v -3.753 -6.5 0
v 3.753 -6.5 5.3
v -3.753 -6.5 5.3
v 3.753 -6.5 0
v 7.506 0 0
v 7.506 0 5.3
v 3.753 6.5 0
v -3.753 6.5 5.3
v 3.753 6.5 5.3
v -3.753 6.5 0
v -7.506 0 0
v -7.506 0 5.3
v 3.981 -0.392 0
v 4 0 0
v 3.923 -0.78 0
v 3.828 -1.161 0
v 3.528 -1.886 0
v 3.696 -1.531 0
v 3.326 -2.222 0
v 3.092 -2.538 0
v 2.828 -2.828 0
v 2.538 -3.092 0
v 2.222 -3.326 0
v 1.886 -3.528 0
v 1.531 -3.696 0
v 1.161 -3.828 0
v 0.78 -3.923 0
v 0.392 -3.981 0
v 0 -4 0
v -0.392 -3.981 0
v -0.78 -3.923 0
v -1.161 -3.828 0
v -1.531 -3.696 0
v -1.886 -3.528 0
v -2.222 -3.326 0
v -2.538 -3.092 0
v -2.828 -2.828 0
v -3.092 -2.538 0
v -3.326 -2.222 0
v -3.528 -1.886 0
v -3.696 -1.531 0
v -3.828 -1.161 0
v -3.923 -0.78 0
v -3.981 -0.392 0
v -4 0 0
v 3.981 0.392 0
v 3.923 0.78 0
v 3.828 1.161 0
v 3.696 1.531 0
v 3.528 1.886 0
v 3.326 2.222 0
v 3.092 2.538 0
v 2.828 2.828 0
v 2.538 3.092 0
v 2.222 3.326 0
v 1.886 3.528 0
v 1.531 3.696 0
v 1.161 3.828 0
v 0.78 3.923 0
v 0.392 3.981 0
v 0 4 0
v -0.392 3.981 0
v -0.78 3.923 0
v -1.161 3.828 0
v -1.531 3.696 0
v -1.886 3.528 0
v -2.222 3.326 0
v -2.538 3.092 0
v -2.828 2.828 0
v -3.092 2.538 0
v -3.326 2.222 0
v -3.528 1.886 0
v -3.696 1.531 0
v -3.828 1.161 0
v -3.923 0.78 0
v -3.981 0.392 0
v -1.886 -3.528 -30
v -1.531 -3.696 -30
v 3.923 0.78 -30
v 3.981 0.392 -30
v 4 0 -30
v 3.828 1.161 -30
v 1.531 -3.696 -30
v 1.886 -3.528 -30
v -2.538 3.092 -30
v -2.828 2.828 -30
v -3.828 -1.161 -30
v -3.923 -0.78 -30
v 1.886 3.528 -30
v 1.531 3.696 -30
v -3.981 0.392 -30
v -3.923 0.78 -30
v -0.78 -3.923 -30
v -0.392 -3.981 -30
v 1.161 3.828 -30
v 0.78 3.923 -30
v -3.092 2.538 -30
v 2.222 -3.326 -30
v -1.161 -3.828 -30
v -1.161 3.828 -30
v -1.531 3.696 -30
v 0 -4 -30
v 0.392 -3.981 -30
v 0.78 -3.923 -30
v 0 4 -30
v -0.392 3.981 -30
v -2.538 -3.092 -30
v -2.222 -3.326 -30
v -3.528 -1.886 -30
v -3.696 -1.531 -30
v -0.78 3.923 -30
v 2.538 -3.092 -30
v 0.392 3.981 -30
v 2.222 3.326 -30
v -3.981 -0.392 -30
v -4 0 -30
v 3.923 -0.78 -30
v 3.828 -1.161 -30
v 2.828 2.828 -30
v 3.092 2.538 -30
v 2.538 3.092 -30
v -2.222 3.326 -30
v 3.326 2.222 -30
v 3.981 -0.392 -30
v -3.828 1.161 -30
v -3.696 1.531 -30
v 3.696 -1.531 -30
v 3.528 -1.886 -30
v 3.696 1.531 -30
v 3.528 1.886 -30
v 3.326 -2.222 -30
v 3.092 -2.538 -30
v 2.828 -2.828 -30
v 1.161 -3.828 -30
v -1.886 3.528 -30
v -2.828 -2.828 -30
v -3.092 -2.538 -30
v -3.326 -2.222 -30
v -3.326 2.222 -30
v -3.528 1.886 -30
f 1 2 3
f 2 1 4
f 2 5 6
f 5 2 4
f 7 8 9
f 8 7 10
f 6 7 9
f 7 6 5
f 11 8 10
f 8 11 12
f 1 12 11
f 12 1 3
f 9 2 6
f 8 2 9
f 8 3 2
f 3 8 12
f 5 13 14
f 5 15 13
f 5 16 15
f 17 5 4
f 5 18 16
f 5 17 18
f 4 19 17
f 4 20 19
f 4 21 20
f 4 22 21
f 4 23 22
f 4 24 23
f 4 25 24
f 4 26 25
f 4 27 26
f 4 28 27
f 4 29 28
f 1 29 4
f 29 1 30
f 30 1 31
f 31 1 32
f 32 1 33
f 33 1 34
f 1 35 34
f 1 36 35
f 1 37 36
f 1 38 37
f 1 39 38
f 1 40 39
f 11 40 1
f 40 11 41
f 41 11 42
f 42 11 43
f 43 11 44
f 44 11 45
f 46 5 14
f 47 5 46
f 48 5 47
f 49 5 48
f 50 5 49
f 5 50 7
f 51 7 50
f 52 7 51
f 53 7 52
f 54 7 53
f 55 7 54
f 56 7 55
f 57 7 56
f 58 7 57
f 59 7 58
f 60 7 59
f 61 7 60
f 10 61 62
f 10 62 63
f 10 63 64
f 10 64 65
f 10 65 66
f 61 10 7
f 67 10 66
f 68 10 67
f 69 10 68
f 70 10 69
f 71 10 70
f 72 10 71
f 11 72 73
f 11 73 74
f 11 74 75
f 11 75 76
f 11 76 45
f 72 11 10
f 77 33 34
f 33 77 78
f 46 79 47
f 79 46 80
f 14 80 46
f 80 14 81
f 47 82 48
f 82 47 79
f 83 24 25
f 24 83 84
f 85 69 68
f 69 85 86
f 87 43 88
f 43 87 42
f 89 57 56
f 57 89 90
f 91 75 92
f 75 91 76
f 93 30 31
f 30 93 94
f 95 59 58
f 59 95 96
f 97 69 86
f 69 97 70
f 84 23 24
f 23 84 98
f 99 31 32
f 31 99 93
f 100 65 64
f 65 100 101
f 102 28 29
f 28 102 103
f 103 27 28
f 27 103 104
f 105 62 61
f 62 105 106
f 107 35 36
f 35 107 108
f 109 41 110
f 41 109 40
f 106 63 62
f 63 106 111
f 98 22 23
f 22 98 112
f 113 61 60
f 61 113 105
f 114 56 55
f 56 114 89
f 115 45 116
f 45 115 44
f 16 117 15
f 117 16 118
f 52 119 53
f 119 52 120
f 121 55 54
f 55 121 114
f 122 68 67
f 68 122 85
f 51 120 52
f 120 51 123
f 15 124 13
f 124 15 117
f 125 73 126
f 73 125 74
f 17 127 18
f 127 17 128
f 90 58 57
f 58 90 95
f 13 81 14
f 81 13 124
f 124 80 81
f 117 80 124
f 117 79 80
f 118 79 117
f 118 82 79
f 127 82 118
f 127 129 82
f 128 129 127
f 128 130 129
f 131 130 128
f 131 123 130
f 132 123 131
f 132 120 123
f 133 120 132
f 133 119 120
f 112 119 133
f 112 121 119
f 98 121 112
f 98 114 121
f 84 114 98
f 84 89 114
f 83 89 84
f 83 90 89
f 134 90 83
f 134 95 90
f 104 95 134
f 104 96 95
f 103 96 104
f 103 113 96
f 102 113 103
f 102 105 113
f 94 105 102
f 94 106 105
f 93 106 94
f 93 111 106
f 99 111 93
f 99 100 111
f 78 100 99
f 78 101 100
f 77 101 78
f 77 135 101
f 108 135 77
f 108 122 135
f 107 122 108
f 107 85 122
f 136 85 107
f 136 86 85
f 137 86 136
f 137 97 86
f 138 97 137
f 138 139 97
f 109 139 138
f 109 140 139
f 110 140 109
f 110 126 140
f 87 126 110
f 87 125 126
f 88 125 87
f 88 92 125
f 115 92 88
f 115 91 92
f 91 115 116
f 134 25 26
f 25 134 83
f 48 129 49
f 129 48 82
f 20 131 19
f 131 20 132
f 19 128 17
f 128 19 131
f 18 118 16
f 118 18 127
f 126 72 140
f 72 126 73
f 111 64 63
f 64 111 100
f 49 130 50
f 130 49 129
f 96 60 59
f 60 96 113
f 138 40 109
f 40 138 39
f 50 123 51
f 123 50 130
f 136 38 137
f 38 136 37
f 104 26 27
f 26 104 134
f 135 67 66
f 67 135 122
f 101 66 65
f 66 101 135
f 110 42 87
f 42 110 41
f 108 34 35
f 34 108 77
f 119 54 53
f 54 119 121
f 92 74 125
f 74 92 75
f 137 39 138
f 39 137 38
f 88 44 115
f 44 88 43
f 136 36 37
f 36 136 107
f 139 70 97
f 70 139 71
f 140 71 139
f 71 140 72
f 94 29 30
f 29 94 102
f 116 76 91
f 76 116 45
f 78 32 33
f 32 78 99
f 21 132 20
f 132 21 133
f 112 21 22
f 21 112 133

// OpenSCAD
// M8 hex bolt (thread omitted, plain cylindrical shank)

$fn = 64;

head_across_flats = 13;   // 対辺距離
head_height       = 5.3;  // 頭部高さ
shank_diameter    = 8;    // シャンク径
shank_length      = 30;   // シャンク長

module hex_head(af, h) {
    // 六角柱: 対辺距離 af (外接円直径 = af / cos(30))
    cylinder(h = h, d = af / cos(180 / 6), $fn = 6);
}

module m8_bolt() {
    // 頭部: 底面 z=0、上方 +Z へ
    hex_head(head_across_flats, head_height);

    // シャンク: z=0 から -Z 方向へ
    translate([0, 0, -shank_length])
        cylinder(h = shank_length, d = shank_diameter);
}

m8_bolt();
